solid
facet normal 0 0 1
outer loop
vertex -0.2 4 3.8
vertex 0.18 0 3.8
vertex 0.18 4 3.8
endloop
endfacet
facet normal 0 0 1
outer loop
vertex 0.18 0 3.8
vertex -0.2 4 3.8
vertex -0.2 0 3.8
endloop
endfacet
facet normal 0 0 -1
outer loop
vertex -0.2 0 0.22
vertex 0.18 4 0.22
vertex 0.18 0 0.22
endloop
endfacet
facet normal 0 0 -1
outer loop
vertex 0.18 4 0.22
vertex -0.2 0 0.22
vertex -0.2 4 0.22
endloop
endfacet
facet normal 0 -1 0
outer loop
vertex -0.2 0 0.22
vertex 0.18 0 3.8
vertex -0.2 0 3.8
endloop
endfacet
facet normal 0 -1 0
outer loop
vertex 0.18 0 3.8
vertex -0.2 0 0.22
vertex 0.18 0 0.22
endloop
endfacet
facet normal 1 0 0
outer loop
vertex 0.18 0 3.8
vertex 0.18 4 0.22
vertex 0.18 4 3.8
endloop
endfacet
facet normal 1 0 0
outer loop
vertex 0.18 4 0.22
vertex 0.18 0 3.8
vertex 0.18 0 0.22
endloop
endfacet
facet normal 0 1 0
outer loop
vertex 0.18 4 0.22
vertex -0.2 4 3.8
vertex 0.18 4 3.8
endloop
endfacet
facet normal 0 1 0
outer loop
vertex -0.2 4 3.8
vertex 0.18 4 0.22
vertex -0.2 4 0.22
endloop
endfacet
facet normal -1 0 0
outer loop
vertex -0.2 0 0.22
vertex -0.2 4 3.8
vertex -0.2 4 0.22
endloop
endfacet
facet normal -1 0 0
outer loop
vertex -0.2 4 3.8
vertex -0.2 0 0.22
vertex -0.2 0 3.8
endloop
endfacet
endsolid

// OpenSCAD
translate([-0.2, 0, 0.22]) {
    color("Cyan");
    cube([0.38, 4, 3.58], false);
}
